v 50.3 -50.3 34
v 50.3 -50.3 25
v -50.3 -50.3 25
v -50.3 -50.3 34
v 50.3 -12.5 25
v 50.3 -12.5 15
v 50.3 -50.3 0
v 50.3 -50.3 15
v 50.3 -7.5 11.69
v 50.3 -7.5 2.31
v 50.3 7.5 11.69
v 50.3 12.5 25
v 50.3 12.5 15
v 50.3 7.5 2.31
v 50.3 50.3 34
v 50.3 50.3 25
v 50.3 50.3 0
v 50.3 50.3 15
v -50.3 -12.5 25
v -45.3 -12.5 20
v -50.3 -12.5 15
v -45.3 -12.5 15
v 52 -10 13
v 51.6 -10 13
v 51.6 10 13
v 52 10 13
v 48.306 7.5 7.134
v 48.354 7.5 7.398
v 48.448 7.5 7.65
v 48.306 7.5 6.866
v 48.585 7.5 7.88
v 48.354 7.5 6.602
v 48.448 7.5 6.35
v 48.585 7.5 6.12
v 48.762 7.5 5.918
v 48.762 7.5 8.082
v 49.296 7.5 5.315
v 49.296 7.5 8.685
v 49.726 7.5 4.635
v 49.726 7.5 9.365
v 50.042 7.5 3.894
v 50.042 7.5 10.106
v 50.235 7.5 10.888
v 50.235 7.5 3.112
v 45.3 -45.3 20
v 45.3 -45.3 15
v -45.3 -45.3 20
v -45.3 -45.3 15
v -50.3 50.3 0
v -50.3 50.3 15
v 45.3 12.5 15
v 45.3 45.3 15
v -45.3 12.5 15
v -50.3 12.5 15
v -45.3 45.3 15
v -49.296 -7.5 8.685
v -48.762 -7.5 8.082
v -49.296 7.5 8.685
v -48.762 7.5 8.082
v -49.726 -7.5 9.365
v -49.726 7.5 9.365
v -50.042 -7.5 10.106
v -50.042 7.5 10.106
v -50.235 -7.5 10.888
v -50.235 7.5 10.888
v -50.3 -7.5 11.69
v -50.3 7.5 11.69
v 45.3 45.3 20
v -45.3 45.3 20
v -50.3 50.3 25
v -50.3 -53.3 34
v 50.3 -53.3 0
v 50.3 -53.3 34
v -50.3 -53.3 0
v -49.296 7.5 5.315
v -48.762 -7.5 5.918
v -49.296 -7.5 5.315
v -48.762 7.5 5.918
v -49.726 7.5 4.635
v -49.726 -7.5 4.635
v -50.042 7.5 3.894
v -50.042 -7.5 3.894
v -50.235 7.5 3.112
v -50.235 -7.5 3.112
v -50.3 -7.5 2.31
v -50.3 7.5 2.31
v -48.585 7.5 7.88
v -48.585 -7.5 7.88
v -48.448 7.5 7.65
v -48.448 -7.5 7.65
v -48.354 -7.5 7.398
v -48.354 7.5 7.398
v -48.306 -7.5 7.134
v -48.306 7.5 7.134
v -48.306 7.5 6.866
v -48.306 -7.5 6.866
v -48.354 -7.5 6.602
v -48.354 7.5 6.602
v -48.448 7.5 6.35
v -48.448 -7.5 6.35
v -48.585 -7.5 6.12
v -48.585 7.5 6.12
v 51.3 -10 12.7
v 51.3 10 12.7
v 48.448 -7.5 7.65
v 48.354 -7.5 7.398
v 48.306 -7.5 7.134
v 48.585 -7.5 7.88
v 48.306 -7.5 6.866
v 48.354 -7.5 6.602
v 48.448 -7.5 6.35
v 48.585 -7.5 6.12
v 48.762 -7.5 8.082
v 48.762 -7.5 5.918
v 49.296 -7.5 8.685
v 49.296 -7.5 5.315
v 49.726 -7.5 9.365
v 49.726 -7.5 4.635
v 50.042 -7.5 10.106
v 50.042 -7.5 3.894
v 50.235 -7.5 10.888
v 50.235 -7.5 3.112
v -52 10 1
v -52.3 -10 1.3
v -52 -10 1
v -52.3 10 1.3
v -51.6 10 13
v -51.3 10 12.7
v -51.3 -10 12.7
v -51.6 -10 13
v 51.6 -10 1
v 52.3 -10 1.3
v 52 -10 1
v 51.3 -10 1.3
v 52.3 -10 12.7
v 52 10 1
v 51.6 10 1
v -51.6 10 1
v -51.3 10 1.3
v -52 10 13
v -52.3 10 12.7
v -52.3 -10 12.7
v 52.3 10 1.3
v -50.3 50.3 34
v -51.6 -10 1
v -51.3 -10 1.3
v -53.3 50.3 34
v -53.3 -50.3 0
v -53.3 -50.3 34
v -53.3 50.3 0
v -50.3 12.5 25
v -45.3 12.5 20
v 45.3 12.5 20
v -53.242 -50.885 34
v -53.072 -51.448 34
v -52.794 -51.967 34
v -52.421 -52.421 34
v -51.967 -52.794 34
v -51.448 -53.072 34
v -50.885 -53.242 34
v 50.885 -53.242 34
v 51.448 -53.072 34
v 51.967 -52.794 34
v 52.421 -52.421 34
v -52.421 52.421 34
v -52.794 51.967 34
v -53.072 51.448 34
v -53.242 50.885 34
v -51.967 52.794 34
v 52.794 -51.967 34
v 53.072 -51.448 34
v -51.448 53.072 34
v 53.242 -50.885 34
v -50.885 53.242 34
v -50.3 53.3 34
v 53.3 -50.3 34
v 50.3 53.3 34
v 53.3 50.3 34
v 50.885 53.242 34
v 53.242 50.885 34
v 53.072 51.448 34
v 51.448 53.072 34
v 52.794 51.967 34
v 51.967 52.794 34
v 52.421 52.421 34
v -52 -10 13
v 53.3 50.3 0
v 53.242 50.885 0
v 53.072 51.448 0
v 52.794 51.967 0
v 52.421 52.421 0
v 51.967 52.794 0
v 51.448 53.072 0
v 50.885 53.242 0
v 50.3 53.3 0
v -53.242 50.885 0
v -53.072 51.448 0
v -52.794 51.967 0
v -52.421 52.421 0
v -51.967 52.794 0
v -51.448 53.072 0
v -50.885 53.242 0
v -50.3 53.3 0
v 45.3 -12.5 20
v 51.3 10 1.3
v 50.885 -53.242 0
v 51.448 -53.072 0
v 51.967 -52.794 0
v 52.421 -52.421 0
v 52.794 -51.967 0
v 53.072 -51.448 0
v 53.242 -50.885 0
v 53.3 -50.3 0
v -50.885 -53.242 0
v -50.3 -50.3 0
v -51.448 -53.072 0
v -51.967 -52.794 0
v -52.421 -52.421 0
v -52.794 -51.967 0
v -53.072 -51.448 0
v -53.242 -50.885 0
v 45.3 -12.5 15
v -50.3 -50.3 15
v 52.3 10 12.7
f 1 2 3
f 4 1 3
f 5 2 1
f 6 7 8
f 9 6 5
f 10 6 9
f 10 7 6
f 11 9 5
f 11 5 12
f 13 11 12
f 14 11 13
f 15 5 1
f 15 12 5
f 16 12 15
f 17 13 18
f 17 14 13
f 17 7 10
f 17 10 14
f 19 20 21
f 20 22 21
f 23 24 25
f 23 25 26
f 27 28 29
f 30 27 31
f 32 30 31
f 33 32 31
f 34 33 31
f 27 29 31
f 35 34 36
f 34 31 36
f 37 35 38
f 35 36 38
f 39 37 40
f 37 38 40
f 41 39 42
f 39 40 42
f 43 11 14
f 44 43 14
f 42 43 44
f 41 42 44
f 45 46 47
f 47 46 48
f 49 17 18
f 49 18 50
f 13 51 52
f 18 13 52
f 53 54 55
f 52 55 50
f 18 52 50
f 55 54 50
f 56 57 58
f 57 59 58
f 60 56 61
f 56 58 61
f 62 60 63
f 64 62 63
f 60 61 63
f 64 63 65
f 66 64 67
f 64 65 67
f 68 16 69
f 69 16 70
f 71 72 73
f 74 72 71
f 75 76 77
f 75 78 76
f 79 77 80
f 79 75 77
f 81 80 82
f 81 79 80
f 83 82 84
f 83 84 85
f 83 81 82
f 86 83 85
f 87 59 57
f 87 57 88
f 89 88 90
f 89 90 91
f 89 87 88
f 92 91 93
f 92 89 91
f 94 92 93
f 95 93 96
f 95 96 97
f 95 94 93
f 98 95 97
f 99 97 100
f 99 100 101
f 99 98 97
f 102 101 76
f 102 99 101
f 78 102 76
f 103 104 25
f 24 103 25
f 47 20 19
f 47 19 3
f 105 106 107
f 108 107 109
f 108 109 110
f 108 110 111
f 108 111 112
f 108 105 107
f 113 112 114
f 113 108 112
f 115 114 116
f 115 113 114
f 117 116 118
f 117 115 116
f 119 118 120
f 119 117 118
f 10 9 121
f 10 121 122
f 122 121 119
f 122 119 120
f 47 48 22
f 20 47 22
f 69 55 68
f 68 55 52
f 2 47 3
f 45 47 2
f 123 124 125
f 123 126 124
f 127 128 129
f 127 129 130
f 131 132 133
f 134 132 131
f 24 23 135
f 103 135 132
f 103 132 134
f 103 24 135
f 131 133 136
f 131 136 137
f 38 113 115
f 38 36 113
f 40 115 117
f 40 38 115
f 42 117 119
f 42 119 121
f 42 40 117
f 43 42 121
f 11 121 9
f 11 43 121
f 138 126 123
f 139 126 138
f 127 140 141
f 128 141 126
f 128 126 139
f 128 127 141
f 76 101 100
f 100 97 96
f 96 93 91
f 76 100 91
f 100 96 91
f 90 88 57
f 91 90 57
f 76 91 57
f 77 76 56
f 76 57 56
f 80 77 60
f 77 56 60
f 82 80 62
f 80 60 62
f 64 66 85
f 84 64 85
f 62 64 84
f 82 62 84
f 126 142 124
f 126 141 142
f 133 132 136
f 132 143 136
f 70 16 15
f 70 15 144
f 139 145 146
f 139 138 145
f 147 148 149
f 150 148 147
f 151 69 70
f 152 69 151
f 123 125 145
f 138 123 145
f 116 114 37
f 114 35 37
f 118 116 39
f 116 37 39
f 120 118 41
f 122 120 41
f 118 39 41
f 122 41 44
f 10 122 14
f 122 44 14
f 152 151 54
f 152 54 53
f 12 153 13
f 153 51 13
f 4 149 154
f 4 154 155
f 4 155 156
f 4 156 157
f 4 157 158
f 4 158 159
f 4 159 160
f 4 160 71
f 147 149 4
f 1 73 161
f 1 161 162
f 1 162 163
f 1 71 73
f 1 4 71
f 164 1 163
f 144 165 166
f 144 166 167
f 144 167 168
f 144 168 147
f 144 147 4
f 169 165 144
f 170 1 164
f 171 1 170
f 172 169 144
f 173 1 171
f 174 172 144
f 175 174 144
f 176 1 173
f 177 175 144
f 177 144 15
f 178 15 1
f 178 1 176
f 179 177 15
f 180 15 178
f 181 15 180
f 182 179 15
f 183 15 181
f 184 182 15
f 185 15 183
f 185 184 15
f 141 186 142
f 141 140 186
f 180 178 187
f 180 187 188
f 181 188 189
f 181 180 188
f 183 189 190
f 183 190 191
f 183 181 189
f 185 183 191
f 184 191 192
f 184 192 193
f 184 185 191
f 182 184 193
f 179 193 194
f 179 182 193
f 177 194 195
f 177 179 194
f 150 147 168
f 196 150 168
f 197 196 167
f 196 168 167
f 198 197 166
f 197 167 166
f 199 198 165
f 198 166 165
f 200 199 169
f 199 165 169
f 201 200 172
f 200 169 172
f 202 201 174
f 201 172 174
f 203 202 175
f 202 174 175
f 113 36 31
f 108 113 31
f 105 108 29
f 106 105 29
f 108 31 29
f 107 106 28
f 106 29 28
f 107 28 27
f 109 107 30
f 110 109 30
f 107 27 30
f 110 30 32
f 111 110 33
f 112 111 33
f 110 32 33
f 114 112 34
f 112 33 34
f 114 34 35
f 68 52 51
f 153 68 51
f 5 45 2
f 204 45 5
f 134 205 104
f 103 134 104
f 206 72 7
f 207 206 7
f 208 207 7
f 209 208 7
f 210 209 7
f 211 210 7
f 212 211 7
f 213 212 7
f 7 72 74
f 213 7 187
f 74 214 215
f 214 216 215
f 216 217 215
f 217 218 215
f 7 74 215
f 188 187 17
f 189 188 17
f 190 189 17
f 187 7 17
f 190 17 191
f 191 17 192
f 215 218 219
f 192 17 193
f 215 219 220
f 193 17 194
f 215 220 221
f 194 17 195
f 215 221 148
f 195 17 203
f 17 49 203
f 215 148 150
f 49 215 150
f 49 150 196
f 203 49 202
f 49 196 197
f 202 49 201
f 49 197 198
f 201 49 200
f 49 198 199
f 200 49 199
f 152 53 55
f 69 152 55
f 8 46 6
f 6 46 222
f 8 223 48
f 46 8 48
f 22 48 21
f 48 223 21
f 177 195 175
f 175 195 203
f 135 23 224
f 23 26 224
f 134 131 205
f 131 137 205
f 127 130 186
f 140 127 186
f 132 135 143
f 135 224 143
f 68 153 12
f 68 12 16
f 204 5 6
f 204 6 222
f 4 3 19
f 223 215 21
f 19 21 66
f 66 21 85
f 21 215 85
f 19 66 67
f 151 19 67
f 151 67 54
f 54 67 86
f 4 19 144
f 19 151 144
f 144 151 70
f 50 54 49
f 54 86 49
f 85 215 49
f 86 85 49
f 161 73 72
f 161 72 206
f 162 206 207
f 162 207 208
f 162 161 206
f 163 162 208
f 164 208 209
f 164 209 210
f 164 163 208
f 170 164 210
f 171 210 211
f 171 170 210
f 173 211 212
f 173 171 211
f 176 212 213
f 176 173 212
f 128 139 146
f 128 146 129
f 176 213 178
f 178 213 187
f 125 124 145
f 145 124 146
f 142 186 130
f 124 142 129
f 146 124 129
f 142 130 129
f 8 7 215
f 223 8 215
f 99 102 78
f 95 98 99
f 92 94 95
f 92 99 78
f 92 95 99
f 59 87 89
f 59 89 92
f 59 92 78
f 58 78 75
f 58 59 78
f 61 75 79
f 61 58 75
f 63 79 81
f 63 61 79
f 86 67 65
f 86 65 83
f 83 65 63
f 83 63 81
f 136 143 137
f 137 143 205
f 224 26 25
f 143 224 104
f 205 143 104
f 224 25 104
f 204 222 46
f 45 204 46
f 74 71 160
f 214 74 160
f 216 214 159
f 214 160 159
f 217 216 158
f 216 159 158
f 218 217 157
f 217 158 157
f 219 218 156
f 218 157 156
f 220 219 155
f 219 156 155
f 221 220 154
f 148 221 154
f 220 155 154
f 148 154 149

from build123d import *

# Parameters (mm, degrees)
SKETCH1_W            = 106.6
SKETCH1_H            = 106.6
SKETCH1_W_2          = 100.6
SKETCH1_H_2          = 100.6
BOSS_EXTRUDE1_DEPTH  = 200
SKETCH2_W            = 75
SKETCH2_H            = 10
CUT_EXTRUDE1_DEPTH   = 214.732964233
CIRPATTERN1_COUNT    = 2
CIRPATTERN1_ANGLE    = 90
FILLET1_R            = 3
BOSS_EXTRUDE2_DEPTH  = 5
SKETCH4_R            = 1.5
BOSS_EXTRUDE3_DEPTH  = 7.5
CUT_EXTRUDE3_DEPTH   = 10
FILLET2_R            = 5
FILLET2_OF_MIRROR3_R = 5
CHAMFER1_SIZE        = 5
SKETCH7_W            = 168.98996808
SKETCH7_H            = 119.087176344
TEST_PIECE_DEPTH     = 166


with BuildPart() as part:
    # Sketch1 → Boss-Extrude1 (new body)
    with BuildSketch(Plane(origin=(0, 0, 0), x_dir=(0, 1, 0), z_dir=(0, 0, 1))):
        Rectangle(SKETCH1_W, SKETCH1_H)
        Rectangle(SKETCH1_W_2, SKETCH1_H_2, mode=Mode.SUBTRACT)
    extrude(amount=BOSS_EXTRUDE1_DEPTH)

    # Sketch2 → Cut-Extrude1 (cut, symmetric)
    with BuildSketch(Plane.YZ):
        with Locations((0, 187.5)):
            Rectangle(SKETCH2_W, SKETCH2_H)
        with Locations((0, 172.5)):
            Rectangle(SKETCH2_W, SKETCH2_H)
        with Locations((0, 157.5)):
            Rectangle(SKETCH2_W, SKETCH2_H)
    cut_extrude1 = extrude(amount=CUT_EXTRUDE1_DEPTH, both=True, mode=Mode.SUBTRACT)

    # CirPattern1: Cut-Extrude1 ×2 about axis
    cirpattern1_axis = Axis((0, 0, 210), (0, 0, -1))
    for i in range(1, CIRPATTERN1_COUNT):
        add(cut_extrude1.rotate(cirpattern1_axis, i * CIRPATTERN1_ANGLE / (CIRPATTERN1_COUNT - 1)), mode=Mode.SUBTRACT)

    # Fillet1
    fillet1_edges = [part.edges().sort_by_distance(p)[0] for p in [
        (-53.3, -53.3, 100),
        (-53.3, 53.3, 100),
        (53.3, 53.3, 100),
        (53.3, -53.3, 100),
    ]]
    fillet(fillet1_edges, radius=FILLET1_R)

    # Sketch3 → Boss-Extrude2 (add)
    with BuildSketch(Plane(origin=(0, 0, 15), x_dir=(0, 1, 0), z_dir=(0, 0, 1))):
        Polygon((-50.3, -50.3), (-12.5, -50.3), (-12.5, -45.3), (-45.3, -45.3), (-45.3, 45.3), (-12.5, 45.3), (-12.5, 50.3), (-50.3, 50.3), align=None)
        Polygon((50.3, -50.3), (50.3, 50.3), (12.5, 50.3), (12.5, 45.3), (45.3, 45.3), (45.3, -45.3), (12.5, -45.3), (12.5, -50.3), align=None)
    extrude(amount=BOSS_EXTRUDE2_DEPTH)

    # Sketch4 → Boss-Extrude3 (add, symmetric)
    with BuildSketch(Plane(origin=(0, 0, 0), x_dir=(-1, 0, 0), z_dir=(0, 1, 0))):
        with Locations((49.8, 7)):
            Circle(SKETCH4_R)
    boss_extrude3 = extrude(amount=BOSS_EXTRUDE3_DEPTH, both=True)

    # Sketch6 → Cut-Extrude3 (cut, symmetric)
    with BuildSketch(Plane(origin=(0, 0, 0), x_dir=(-1, 0, 0), z_dir=(0, 1, 0))):
        Polygon((51.6, 13), (52, 13), (52.3, 12.7), (52.3, 1.3), (52, 1), (51.6, 1), (51.3, 1.3), (51.3, 12.7), align=None)
    cut_extrude3 = extrude(amount=CUT_EXTRUDE3_DEPTH, both=True, mode=Mode.SUBTRACT)

    # Fillet2
    fillet2_edges = [part.edges().sort_by_distance(p)[0] for p in [
        (-50.3, 0, 5.585786438),
        (-50.3, 0, 8.414213562),
    ]]
    fillet(fillet2_edges, radius=FILLET2_R)

    # Mirror3: Boss-Extrude3, Cut-Extrude3 across plane
    add(boss_extrude3.mirror(Plane(origin=(0, 0, 0), x_dir=(0, 0, 1), z_dir=(1, 0, 0))))
    add(cut_extrude3.mirror(Plane(origin=(0, 0, 0), x_dir=(0, 0, 1), z_dir=(1, 0, 0))), mode=Mode.SUBTRACT)

    # Fillet2 of Mirror3
    fillet2_of_mirror3_edges = [part.edges().sort_by_distance(p)[0] for p in [
        (50.3, 0, 5.585786438),
        (50.3, 0, 8.414213562),
    ]]
    fillet(fillet2_of_mirror3_edges, radius=FILLET2_OF_MIRROR3_R)

    # Chamfer1
    chamfer1_edges = [part.edges().sort_by_distance(p)[0] for p in [
        (50.3, 31.4, 20),
        (0, 50.3, 20),
        (-50.3, 31.4, 20),
        (-50.3, -31.4, 20),
        (0, -50.3, 20),
        (50.3, -31.4, 20),
    ]]
    chamfer(chamfer1_edges, length=CHAMFER1_SIZE - 0.0001)  # a hair under: the kernel refuses the full size

    # Sketch7 → test_piece (cut)
    with BuildSketch(Plane.XY.offset(200)):
        Rectangle(SKETCH7_W, SKETCH7_H)
    extrude(amount=-TEST_PIECE_DEPTH, mode=Mode.SUBTRACT)


solid = part.part
